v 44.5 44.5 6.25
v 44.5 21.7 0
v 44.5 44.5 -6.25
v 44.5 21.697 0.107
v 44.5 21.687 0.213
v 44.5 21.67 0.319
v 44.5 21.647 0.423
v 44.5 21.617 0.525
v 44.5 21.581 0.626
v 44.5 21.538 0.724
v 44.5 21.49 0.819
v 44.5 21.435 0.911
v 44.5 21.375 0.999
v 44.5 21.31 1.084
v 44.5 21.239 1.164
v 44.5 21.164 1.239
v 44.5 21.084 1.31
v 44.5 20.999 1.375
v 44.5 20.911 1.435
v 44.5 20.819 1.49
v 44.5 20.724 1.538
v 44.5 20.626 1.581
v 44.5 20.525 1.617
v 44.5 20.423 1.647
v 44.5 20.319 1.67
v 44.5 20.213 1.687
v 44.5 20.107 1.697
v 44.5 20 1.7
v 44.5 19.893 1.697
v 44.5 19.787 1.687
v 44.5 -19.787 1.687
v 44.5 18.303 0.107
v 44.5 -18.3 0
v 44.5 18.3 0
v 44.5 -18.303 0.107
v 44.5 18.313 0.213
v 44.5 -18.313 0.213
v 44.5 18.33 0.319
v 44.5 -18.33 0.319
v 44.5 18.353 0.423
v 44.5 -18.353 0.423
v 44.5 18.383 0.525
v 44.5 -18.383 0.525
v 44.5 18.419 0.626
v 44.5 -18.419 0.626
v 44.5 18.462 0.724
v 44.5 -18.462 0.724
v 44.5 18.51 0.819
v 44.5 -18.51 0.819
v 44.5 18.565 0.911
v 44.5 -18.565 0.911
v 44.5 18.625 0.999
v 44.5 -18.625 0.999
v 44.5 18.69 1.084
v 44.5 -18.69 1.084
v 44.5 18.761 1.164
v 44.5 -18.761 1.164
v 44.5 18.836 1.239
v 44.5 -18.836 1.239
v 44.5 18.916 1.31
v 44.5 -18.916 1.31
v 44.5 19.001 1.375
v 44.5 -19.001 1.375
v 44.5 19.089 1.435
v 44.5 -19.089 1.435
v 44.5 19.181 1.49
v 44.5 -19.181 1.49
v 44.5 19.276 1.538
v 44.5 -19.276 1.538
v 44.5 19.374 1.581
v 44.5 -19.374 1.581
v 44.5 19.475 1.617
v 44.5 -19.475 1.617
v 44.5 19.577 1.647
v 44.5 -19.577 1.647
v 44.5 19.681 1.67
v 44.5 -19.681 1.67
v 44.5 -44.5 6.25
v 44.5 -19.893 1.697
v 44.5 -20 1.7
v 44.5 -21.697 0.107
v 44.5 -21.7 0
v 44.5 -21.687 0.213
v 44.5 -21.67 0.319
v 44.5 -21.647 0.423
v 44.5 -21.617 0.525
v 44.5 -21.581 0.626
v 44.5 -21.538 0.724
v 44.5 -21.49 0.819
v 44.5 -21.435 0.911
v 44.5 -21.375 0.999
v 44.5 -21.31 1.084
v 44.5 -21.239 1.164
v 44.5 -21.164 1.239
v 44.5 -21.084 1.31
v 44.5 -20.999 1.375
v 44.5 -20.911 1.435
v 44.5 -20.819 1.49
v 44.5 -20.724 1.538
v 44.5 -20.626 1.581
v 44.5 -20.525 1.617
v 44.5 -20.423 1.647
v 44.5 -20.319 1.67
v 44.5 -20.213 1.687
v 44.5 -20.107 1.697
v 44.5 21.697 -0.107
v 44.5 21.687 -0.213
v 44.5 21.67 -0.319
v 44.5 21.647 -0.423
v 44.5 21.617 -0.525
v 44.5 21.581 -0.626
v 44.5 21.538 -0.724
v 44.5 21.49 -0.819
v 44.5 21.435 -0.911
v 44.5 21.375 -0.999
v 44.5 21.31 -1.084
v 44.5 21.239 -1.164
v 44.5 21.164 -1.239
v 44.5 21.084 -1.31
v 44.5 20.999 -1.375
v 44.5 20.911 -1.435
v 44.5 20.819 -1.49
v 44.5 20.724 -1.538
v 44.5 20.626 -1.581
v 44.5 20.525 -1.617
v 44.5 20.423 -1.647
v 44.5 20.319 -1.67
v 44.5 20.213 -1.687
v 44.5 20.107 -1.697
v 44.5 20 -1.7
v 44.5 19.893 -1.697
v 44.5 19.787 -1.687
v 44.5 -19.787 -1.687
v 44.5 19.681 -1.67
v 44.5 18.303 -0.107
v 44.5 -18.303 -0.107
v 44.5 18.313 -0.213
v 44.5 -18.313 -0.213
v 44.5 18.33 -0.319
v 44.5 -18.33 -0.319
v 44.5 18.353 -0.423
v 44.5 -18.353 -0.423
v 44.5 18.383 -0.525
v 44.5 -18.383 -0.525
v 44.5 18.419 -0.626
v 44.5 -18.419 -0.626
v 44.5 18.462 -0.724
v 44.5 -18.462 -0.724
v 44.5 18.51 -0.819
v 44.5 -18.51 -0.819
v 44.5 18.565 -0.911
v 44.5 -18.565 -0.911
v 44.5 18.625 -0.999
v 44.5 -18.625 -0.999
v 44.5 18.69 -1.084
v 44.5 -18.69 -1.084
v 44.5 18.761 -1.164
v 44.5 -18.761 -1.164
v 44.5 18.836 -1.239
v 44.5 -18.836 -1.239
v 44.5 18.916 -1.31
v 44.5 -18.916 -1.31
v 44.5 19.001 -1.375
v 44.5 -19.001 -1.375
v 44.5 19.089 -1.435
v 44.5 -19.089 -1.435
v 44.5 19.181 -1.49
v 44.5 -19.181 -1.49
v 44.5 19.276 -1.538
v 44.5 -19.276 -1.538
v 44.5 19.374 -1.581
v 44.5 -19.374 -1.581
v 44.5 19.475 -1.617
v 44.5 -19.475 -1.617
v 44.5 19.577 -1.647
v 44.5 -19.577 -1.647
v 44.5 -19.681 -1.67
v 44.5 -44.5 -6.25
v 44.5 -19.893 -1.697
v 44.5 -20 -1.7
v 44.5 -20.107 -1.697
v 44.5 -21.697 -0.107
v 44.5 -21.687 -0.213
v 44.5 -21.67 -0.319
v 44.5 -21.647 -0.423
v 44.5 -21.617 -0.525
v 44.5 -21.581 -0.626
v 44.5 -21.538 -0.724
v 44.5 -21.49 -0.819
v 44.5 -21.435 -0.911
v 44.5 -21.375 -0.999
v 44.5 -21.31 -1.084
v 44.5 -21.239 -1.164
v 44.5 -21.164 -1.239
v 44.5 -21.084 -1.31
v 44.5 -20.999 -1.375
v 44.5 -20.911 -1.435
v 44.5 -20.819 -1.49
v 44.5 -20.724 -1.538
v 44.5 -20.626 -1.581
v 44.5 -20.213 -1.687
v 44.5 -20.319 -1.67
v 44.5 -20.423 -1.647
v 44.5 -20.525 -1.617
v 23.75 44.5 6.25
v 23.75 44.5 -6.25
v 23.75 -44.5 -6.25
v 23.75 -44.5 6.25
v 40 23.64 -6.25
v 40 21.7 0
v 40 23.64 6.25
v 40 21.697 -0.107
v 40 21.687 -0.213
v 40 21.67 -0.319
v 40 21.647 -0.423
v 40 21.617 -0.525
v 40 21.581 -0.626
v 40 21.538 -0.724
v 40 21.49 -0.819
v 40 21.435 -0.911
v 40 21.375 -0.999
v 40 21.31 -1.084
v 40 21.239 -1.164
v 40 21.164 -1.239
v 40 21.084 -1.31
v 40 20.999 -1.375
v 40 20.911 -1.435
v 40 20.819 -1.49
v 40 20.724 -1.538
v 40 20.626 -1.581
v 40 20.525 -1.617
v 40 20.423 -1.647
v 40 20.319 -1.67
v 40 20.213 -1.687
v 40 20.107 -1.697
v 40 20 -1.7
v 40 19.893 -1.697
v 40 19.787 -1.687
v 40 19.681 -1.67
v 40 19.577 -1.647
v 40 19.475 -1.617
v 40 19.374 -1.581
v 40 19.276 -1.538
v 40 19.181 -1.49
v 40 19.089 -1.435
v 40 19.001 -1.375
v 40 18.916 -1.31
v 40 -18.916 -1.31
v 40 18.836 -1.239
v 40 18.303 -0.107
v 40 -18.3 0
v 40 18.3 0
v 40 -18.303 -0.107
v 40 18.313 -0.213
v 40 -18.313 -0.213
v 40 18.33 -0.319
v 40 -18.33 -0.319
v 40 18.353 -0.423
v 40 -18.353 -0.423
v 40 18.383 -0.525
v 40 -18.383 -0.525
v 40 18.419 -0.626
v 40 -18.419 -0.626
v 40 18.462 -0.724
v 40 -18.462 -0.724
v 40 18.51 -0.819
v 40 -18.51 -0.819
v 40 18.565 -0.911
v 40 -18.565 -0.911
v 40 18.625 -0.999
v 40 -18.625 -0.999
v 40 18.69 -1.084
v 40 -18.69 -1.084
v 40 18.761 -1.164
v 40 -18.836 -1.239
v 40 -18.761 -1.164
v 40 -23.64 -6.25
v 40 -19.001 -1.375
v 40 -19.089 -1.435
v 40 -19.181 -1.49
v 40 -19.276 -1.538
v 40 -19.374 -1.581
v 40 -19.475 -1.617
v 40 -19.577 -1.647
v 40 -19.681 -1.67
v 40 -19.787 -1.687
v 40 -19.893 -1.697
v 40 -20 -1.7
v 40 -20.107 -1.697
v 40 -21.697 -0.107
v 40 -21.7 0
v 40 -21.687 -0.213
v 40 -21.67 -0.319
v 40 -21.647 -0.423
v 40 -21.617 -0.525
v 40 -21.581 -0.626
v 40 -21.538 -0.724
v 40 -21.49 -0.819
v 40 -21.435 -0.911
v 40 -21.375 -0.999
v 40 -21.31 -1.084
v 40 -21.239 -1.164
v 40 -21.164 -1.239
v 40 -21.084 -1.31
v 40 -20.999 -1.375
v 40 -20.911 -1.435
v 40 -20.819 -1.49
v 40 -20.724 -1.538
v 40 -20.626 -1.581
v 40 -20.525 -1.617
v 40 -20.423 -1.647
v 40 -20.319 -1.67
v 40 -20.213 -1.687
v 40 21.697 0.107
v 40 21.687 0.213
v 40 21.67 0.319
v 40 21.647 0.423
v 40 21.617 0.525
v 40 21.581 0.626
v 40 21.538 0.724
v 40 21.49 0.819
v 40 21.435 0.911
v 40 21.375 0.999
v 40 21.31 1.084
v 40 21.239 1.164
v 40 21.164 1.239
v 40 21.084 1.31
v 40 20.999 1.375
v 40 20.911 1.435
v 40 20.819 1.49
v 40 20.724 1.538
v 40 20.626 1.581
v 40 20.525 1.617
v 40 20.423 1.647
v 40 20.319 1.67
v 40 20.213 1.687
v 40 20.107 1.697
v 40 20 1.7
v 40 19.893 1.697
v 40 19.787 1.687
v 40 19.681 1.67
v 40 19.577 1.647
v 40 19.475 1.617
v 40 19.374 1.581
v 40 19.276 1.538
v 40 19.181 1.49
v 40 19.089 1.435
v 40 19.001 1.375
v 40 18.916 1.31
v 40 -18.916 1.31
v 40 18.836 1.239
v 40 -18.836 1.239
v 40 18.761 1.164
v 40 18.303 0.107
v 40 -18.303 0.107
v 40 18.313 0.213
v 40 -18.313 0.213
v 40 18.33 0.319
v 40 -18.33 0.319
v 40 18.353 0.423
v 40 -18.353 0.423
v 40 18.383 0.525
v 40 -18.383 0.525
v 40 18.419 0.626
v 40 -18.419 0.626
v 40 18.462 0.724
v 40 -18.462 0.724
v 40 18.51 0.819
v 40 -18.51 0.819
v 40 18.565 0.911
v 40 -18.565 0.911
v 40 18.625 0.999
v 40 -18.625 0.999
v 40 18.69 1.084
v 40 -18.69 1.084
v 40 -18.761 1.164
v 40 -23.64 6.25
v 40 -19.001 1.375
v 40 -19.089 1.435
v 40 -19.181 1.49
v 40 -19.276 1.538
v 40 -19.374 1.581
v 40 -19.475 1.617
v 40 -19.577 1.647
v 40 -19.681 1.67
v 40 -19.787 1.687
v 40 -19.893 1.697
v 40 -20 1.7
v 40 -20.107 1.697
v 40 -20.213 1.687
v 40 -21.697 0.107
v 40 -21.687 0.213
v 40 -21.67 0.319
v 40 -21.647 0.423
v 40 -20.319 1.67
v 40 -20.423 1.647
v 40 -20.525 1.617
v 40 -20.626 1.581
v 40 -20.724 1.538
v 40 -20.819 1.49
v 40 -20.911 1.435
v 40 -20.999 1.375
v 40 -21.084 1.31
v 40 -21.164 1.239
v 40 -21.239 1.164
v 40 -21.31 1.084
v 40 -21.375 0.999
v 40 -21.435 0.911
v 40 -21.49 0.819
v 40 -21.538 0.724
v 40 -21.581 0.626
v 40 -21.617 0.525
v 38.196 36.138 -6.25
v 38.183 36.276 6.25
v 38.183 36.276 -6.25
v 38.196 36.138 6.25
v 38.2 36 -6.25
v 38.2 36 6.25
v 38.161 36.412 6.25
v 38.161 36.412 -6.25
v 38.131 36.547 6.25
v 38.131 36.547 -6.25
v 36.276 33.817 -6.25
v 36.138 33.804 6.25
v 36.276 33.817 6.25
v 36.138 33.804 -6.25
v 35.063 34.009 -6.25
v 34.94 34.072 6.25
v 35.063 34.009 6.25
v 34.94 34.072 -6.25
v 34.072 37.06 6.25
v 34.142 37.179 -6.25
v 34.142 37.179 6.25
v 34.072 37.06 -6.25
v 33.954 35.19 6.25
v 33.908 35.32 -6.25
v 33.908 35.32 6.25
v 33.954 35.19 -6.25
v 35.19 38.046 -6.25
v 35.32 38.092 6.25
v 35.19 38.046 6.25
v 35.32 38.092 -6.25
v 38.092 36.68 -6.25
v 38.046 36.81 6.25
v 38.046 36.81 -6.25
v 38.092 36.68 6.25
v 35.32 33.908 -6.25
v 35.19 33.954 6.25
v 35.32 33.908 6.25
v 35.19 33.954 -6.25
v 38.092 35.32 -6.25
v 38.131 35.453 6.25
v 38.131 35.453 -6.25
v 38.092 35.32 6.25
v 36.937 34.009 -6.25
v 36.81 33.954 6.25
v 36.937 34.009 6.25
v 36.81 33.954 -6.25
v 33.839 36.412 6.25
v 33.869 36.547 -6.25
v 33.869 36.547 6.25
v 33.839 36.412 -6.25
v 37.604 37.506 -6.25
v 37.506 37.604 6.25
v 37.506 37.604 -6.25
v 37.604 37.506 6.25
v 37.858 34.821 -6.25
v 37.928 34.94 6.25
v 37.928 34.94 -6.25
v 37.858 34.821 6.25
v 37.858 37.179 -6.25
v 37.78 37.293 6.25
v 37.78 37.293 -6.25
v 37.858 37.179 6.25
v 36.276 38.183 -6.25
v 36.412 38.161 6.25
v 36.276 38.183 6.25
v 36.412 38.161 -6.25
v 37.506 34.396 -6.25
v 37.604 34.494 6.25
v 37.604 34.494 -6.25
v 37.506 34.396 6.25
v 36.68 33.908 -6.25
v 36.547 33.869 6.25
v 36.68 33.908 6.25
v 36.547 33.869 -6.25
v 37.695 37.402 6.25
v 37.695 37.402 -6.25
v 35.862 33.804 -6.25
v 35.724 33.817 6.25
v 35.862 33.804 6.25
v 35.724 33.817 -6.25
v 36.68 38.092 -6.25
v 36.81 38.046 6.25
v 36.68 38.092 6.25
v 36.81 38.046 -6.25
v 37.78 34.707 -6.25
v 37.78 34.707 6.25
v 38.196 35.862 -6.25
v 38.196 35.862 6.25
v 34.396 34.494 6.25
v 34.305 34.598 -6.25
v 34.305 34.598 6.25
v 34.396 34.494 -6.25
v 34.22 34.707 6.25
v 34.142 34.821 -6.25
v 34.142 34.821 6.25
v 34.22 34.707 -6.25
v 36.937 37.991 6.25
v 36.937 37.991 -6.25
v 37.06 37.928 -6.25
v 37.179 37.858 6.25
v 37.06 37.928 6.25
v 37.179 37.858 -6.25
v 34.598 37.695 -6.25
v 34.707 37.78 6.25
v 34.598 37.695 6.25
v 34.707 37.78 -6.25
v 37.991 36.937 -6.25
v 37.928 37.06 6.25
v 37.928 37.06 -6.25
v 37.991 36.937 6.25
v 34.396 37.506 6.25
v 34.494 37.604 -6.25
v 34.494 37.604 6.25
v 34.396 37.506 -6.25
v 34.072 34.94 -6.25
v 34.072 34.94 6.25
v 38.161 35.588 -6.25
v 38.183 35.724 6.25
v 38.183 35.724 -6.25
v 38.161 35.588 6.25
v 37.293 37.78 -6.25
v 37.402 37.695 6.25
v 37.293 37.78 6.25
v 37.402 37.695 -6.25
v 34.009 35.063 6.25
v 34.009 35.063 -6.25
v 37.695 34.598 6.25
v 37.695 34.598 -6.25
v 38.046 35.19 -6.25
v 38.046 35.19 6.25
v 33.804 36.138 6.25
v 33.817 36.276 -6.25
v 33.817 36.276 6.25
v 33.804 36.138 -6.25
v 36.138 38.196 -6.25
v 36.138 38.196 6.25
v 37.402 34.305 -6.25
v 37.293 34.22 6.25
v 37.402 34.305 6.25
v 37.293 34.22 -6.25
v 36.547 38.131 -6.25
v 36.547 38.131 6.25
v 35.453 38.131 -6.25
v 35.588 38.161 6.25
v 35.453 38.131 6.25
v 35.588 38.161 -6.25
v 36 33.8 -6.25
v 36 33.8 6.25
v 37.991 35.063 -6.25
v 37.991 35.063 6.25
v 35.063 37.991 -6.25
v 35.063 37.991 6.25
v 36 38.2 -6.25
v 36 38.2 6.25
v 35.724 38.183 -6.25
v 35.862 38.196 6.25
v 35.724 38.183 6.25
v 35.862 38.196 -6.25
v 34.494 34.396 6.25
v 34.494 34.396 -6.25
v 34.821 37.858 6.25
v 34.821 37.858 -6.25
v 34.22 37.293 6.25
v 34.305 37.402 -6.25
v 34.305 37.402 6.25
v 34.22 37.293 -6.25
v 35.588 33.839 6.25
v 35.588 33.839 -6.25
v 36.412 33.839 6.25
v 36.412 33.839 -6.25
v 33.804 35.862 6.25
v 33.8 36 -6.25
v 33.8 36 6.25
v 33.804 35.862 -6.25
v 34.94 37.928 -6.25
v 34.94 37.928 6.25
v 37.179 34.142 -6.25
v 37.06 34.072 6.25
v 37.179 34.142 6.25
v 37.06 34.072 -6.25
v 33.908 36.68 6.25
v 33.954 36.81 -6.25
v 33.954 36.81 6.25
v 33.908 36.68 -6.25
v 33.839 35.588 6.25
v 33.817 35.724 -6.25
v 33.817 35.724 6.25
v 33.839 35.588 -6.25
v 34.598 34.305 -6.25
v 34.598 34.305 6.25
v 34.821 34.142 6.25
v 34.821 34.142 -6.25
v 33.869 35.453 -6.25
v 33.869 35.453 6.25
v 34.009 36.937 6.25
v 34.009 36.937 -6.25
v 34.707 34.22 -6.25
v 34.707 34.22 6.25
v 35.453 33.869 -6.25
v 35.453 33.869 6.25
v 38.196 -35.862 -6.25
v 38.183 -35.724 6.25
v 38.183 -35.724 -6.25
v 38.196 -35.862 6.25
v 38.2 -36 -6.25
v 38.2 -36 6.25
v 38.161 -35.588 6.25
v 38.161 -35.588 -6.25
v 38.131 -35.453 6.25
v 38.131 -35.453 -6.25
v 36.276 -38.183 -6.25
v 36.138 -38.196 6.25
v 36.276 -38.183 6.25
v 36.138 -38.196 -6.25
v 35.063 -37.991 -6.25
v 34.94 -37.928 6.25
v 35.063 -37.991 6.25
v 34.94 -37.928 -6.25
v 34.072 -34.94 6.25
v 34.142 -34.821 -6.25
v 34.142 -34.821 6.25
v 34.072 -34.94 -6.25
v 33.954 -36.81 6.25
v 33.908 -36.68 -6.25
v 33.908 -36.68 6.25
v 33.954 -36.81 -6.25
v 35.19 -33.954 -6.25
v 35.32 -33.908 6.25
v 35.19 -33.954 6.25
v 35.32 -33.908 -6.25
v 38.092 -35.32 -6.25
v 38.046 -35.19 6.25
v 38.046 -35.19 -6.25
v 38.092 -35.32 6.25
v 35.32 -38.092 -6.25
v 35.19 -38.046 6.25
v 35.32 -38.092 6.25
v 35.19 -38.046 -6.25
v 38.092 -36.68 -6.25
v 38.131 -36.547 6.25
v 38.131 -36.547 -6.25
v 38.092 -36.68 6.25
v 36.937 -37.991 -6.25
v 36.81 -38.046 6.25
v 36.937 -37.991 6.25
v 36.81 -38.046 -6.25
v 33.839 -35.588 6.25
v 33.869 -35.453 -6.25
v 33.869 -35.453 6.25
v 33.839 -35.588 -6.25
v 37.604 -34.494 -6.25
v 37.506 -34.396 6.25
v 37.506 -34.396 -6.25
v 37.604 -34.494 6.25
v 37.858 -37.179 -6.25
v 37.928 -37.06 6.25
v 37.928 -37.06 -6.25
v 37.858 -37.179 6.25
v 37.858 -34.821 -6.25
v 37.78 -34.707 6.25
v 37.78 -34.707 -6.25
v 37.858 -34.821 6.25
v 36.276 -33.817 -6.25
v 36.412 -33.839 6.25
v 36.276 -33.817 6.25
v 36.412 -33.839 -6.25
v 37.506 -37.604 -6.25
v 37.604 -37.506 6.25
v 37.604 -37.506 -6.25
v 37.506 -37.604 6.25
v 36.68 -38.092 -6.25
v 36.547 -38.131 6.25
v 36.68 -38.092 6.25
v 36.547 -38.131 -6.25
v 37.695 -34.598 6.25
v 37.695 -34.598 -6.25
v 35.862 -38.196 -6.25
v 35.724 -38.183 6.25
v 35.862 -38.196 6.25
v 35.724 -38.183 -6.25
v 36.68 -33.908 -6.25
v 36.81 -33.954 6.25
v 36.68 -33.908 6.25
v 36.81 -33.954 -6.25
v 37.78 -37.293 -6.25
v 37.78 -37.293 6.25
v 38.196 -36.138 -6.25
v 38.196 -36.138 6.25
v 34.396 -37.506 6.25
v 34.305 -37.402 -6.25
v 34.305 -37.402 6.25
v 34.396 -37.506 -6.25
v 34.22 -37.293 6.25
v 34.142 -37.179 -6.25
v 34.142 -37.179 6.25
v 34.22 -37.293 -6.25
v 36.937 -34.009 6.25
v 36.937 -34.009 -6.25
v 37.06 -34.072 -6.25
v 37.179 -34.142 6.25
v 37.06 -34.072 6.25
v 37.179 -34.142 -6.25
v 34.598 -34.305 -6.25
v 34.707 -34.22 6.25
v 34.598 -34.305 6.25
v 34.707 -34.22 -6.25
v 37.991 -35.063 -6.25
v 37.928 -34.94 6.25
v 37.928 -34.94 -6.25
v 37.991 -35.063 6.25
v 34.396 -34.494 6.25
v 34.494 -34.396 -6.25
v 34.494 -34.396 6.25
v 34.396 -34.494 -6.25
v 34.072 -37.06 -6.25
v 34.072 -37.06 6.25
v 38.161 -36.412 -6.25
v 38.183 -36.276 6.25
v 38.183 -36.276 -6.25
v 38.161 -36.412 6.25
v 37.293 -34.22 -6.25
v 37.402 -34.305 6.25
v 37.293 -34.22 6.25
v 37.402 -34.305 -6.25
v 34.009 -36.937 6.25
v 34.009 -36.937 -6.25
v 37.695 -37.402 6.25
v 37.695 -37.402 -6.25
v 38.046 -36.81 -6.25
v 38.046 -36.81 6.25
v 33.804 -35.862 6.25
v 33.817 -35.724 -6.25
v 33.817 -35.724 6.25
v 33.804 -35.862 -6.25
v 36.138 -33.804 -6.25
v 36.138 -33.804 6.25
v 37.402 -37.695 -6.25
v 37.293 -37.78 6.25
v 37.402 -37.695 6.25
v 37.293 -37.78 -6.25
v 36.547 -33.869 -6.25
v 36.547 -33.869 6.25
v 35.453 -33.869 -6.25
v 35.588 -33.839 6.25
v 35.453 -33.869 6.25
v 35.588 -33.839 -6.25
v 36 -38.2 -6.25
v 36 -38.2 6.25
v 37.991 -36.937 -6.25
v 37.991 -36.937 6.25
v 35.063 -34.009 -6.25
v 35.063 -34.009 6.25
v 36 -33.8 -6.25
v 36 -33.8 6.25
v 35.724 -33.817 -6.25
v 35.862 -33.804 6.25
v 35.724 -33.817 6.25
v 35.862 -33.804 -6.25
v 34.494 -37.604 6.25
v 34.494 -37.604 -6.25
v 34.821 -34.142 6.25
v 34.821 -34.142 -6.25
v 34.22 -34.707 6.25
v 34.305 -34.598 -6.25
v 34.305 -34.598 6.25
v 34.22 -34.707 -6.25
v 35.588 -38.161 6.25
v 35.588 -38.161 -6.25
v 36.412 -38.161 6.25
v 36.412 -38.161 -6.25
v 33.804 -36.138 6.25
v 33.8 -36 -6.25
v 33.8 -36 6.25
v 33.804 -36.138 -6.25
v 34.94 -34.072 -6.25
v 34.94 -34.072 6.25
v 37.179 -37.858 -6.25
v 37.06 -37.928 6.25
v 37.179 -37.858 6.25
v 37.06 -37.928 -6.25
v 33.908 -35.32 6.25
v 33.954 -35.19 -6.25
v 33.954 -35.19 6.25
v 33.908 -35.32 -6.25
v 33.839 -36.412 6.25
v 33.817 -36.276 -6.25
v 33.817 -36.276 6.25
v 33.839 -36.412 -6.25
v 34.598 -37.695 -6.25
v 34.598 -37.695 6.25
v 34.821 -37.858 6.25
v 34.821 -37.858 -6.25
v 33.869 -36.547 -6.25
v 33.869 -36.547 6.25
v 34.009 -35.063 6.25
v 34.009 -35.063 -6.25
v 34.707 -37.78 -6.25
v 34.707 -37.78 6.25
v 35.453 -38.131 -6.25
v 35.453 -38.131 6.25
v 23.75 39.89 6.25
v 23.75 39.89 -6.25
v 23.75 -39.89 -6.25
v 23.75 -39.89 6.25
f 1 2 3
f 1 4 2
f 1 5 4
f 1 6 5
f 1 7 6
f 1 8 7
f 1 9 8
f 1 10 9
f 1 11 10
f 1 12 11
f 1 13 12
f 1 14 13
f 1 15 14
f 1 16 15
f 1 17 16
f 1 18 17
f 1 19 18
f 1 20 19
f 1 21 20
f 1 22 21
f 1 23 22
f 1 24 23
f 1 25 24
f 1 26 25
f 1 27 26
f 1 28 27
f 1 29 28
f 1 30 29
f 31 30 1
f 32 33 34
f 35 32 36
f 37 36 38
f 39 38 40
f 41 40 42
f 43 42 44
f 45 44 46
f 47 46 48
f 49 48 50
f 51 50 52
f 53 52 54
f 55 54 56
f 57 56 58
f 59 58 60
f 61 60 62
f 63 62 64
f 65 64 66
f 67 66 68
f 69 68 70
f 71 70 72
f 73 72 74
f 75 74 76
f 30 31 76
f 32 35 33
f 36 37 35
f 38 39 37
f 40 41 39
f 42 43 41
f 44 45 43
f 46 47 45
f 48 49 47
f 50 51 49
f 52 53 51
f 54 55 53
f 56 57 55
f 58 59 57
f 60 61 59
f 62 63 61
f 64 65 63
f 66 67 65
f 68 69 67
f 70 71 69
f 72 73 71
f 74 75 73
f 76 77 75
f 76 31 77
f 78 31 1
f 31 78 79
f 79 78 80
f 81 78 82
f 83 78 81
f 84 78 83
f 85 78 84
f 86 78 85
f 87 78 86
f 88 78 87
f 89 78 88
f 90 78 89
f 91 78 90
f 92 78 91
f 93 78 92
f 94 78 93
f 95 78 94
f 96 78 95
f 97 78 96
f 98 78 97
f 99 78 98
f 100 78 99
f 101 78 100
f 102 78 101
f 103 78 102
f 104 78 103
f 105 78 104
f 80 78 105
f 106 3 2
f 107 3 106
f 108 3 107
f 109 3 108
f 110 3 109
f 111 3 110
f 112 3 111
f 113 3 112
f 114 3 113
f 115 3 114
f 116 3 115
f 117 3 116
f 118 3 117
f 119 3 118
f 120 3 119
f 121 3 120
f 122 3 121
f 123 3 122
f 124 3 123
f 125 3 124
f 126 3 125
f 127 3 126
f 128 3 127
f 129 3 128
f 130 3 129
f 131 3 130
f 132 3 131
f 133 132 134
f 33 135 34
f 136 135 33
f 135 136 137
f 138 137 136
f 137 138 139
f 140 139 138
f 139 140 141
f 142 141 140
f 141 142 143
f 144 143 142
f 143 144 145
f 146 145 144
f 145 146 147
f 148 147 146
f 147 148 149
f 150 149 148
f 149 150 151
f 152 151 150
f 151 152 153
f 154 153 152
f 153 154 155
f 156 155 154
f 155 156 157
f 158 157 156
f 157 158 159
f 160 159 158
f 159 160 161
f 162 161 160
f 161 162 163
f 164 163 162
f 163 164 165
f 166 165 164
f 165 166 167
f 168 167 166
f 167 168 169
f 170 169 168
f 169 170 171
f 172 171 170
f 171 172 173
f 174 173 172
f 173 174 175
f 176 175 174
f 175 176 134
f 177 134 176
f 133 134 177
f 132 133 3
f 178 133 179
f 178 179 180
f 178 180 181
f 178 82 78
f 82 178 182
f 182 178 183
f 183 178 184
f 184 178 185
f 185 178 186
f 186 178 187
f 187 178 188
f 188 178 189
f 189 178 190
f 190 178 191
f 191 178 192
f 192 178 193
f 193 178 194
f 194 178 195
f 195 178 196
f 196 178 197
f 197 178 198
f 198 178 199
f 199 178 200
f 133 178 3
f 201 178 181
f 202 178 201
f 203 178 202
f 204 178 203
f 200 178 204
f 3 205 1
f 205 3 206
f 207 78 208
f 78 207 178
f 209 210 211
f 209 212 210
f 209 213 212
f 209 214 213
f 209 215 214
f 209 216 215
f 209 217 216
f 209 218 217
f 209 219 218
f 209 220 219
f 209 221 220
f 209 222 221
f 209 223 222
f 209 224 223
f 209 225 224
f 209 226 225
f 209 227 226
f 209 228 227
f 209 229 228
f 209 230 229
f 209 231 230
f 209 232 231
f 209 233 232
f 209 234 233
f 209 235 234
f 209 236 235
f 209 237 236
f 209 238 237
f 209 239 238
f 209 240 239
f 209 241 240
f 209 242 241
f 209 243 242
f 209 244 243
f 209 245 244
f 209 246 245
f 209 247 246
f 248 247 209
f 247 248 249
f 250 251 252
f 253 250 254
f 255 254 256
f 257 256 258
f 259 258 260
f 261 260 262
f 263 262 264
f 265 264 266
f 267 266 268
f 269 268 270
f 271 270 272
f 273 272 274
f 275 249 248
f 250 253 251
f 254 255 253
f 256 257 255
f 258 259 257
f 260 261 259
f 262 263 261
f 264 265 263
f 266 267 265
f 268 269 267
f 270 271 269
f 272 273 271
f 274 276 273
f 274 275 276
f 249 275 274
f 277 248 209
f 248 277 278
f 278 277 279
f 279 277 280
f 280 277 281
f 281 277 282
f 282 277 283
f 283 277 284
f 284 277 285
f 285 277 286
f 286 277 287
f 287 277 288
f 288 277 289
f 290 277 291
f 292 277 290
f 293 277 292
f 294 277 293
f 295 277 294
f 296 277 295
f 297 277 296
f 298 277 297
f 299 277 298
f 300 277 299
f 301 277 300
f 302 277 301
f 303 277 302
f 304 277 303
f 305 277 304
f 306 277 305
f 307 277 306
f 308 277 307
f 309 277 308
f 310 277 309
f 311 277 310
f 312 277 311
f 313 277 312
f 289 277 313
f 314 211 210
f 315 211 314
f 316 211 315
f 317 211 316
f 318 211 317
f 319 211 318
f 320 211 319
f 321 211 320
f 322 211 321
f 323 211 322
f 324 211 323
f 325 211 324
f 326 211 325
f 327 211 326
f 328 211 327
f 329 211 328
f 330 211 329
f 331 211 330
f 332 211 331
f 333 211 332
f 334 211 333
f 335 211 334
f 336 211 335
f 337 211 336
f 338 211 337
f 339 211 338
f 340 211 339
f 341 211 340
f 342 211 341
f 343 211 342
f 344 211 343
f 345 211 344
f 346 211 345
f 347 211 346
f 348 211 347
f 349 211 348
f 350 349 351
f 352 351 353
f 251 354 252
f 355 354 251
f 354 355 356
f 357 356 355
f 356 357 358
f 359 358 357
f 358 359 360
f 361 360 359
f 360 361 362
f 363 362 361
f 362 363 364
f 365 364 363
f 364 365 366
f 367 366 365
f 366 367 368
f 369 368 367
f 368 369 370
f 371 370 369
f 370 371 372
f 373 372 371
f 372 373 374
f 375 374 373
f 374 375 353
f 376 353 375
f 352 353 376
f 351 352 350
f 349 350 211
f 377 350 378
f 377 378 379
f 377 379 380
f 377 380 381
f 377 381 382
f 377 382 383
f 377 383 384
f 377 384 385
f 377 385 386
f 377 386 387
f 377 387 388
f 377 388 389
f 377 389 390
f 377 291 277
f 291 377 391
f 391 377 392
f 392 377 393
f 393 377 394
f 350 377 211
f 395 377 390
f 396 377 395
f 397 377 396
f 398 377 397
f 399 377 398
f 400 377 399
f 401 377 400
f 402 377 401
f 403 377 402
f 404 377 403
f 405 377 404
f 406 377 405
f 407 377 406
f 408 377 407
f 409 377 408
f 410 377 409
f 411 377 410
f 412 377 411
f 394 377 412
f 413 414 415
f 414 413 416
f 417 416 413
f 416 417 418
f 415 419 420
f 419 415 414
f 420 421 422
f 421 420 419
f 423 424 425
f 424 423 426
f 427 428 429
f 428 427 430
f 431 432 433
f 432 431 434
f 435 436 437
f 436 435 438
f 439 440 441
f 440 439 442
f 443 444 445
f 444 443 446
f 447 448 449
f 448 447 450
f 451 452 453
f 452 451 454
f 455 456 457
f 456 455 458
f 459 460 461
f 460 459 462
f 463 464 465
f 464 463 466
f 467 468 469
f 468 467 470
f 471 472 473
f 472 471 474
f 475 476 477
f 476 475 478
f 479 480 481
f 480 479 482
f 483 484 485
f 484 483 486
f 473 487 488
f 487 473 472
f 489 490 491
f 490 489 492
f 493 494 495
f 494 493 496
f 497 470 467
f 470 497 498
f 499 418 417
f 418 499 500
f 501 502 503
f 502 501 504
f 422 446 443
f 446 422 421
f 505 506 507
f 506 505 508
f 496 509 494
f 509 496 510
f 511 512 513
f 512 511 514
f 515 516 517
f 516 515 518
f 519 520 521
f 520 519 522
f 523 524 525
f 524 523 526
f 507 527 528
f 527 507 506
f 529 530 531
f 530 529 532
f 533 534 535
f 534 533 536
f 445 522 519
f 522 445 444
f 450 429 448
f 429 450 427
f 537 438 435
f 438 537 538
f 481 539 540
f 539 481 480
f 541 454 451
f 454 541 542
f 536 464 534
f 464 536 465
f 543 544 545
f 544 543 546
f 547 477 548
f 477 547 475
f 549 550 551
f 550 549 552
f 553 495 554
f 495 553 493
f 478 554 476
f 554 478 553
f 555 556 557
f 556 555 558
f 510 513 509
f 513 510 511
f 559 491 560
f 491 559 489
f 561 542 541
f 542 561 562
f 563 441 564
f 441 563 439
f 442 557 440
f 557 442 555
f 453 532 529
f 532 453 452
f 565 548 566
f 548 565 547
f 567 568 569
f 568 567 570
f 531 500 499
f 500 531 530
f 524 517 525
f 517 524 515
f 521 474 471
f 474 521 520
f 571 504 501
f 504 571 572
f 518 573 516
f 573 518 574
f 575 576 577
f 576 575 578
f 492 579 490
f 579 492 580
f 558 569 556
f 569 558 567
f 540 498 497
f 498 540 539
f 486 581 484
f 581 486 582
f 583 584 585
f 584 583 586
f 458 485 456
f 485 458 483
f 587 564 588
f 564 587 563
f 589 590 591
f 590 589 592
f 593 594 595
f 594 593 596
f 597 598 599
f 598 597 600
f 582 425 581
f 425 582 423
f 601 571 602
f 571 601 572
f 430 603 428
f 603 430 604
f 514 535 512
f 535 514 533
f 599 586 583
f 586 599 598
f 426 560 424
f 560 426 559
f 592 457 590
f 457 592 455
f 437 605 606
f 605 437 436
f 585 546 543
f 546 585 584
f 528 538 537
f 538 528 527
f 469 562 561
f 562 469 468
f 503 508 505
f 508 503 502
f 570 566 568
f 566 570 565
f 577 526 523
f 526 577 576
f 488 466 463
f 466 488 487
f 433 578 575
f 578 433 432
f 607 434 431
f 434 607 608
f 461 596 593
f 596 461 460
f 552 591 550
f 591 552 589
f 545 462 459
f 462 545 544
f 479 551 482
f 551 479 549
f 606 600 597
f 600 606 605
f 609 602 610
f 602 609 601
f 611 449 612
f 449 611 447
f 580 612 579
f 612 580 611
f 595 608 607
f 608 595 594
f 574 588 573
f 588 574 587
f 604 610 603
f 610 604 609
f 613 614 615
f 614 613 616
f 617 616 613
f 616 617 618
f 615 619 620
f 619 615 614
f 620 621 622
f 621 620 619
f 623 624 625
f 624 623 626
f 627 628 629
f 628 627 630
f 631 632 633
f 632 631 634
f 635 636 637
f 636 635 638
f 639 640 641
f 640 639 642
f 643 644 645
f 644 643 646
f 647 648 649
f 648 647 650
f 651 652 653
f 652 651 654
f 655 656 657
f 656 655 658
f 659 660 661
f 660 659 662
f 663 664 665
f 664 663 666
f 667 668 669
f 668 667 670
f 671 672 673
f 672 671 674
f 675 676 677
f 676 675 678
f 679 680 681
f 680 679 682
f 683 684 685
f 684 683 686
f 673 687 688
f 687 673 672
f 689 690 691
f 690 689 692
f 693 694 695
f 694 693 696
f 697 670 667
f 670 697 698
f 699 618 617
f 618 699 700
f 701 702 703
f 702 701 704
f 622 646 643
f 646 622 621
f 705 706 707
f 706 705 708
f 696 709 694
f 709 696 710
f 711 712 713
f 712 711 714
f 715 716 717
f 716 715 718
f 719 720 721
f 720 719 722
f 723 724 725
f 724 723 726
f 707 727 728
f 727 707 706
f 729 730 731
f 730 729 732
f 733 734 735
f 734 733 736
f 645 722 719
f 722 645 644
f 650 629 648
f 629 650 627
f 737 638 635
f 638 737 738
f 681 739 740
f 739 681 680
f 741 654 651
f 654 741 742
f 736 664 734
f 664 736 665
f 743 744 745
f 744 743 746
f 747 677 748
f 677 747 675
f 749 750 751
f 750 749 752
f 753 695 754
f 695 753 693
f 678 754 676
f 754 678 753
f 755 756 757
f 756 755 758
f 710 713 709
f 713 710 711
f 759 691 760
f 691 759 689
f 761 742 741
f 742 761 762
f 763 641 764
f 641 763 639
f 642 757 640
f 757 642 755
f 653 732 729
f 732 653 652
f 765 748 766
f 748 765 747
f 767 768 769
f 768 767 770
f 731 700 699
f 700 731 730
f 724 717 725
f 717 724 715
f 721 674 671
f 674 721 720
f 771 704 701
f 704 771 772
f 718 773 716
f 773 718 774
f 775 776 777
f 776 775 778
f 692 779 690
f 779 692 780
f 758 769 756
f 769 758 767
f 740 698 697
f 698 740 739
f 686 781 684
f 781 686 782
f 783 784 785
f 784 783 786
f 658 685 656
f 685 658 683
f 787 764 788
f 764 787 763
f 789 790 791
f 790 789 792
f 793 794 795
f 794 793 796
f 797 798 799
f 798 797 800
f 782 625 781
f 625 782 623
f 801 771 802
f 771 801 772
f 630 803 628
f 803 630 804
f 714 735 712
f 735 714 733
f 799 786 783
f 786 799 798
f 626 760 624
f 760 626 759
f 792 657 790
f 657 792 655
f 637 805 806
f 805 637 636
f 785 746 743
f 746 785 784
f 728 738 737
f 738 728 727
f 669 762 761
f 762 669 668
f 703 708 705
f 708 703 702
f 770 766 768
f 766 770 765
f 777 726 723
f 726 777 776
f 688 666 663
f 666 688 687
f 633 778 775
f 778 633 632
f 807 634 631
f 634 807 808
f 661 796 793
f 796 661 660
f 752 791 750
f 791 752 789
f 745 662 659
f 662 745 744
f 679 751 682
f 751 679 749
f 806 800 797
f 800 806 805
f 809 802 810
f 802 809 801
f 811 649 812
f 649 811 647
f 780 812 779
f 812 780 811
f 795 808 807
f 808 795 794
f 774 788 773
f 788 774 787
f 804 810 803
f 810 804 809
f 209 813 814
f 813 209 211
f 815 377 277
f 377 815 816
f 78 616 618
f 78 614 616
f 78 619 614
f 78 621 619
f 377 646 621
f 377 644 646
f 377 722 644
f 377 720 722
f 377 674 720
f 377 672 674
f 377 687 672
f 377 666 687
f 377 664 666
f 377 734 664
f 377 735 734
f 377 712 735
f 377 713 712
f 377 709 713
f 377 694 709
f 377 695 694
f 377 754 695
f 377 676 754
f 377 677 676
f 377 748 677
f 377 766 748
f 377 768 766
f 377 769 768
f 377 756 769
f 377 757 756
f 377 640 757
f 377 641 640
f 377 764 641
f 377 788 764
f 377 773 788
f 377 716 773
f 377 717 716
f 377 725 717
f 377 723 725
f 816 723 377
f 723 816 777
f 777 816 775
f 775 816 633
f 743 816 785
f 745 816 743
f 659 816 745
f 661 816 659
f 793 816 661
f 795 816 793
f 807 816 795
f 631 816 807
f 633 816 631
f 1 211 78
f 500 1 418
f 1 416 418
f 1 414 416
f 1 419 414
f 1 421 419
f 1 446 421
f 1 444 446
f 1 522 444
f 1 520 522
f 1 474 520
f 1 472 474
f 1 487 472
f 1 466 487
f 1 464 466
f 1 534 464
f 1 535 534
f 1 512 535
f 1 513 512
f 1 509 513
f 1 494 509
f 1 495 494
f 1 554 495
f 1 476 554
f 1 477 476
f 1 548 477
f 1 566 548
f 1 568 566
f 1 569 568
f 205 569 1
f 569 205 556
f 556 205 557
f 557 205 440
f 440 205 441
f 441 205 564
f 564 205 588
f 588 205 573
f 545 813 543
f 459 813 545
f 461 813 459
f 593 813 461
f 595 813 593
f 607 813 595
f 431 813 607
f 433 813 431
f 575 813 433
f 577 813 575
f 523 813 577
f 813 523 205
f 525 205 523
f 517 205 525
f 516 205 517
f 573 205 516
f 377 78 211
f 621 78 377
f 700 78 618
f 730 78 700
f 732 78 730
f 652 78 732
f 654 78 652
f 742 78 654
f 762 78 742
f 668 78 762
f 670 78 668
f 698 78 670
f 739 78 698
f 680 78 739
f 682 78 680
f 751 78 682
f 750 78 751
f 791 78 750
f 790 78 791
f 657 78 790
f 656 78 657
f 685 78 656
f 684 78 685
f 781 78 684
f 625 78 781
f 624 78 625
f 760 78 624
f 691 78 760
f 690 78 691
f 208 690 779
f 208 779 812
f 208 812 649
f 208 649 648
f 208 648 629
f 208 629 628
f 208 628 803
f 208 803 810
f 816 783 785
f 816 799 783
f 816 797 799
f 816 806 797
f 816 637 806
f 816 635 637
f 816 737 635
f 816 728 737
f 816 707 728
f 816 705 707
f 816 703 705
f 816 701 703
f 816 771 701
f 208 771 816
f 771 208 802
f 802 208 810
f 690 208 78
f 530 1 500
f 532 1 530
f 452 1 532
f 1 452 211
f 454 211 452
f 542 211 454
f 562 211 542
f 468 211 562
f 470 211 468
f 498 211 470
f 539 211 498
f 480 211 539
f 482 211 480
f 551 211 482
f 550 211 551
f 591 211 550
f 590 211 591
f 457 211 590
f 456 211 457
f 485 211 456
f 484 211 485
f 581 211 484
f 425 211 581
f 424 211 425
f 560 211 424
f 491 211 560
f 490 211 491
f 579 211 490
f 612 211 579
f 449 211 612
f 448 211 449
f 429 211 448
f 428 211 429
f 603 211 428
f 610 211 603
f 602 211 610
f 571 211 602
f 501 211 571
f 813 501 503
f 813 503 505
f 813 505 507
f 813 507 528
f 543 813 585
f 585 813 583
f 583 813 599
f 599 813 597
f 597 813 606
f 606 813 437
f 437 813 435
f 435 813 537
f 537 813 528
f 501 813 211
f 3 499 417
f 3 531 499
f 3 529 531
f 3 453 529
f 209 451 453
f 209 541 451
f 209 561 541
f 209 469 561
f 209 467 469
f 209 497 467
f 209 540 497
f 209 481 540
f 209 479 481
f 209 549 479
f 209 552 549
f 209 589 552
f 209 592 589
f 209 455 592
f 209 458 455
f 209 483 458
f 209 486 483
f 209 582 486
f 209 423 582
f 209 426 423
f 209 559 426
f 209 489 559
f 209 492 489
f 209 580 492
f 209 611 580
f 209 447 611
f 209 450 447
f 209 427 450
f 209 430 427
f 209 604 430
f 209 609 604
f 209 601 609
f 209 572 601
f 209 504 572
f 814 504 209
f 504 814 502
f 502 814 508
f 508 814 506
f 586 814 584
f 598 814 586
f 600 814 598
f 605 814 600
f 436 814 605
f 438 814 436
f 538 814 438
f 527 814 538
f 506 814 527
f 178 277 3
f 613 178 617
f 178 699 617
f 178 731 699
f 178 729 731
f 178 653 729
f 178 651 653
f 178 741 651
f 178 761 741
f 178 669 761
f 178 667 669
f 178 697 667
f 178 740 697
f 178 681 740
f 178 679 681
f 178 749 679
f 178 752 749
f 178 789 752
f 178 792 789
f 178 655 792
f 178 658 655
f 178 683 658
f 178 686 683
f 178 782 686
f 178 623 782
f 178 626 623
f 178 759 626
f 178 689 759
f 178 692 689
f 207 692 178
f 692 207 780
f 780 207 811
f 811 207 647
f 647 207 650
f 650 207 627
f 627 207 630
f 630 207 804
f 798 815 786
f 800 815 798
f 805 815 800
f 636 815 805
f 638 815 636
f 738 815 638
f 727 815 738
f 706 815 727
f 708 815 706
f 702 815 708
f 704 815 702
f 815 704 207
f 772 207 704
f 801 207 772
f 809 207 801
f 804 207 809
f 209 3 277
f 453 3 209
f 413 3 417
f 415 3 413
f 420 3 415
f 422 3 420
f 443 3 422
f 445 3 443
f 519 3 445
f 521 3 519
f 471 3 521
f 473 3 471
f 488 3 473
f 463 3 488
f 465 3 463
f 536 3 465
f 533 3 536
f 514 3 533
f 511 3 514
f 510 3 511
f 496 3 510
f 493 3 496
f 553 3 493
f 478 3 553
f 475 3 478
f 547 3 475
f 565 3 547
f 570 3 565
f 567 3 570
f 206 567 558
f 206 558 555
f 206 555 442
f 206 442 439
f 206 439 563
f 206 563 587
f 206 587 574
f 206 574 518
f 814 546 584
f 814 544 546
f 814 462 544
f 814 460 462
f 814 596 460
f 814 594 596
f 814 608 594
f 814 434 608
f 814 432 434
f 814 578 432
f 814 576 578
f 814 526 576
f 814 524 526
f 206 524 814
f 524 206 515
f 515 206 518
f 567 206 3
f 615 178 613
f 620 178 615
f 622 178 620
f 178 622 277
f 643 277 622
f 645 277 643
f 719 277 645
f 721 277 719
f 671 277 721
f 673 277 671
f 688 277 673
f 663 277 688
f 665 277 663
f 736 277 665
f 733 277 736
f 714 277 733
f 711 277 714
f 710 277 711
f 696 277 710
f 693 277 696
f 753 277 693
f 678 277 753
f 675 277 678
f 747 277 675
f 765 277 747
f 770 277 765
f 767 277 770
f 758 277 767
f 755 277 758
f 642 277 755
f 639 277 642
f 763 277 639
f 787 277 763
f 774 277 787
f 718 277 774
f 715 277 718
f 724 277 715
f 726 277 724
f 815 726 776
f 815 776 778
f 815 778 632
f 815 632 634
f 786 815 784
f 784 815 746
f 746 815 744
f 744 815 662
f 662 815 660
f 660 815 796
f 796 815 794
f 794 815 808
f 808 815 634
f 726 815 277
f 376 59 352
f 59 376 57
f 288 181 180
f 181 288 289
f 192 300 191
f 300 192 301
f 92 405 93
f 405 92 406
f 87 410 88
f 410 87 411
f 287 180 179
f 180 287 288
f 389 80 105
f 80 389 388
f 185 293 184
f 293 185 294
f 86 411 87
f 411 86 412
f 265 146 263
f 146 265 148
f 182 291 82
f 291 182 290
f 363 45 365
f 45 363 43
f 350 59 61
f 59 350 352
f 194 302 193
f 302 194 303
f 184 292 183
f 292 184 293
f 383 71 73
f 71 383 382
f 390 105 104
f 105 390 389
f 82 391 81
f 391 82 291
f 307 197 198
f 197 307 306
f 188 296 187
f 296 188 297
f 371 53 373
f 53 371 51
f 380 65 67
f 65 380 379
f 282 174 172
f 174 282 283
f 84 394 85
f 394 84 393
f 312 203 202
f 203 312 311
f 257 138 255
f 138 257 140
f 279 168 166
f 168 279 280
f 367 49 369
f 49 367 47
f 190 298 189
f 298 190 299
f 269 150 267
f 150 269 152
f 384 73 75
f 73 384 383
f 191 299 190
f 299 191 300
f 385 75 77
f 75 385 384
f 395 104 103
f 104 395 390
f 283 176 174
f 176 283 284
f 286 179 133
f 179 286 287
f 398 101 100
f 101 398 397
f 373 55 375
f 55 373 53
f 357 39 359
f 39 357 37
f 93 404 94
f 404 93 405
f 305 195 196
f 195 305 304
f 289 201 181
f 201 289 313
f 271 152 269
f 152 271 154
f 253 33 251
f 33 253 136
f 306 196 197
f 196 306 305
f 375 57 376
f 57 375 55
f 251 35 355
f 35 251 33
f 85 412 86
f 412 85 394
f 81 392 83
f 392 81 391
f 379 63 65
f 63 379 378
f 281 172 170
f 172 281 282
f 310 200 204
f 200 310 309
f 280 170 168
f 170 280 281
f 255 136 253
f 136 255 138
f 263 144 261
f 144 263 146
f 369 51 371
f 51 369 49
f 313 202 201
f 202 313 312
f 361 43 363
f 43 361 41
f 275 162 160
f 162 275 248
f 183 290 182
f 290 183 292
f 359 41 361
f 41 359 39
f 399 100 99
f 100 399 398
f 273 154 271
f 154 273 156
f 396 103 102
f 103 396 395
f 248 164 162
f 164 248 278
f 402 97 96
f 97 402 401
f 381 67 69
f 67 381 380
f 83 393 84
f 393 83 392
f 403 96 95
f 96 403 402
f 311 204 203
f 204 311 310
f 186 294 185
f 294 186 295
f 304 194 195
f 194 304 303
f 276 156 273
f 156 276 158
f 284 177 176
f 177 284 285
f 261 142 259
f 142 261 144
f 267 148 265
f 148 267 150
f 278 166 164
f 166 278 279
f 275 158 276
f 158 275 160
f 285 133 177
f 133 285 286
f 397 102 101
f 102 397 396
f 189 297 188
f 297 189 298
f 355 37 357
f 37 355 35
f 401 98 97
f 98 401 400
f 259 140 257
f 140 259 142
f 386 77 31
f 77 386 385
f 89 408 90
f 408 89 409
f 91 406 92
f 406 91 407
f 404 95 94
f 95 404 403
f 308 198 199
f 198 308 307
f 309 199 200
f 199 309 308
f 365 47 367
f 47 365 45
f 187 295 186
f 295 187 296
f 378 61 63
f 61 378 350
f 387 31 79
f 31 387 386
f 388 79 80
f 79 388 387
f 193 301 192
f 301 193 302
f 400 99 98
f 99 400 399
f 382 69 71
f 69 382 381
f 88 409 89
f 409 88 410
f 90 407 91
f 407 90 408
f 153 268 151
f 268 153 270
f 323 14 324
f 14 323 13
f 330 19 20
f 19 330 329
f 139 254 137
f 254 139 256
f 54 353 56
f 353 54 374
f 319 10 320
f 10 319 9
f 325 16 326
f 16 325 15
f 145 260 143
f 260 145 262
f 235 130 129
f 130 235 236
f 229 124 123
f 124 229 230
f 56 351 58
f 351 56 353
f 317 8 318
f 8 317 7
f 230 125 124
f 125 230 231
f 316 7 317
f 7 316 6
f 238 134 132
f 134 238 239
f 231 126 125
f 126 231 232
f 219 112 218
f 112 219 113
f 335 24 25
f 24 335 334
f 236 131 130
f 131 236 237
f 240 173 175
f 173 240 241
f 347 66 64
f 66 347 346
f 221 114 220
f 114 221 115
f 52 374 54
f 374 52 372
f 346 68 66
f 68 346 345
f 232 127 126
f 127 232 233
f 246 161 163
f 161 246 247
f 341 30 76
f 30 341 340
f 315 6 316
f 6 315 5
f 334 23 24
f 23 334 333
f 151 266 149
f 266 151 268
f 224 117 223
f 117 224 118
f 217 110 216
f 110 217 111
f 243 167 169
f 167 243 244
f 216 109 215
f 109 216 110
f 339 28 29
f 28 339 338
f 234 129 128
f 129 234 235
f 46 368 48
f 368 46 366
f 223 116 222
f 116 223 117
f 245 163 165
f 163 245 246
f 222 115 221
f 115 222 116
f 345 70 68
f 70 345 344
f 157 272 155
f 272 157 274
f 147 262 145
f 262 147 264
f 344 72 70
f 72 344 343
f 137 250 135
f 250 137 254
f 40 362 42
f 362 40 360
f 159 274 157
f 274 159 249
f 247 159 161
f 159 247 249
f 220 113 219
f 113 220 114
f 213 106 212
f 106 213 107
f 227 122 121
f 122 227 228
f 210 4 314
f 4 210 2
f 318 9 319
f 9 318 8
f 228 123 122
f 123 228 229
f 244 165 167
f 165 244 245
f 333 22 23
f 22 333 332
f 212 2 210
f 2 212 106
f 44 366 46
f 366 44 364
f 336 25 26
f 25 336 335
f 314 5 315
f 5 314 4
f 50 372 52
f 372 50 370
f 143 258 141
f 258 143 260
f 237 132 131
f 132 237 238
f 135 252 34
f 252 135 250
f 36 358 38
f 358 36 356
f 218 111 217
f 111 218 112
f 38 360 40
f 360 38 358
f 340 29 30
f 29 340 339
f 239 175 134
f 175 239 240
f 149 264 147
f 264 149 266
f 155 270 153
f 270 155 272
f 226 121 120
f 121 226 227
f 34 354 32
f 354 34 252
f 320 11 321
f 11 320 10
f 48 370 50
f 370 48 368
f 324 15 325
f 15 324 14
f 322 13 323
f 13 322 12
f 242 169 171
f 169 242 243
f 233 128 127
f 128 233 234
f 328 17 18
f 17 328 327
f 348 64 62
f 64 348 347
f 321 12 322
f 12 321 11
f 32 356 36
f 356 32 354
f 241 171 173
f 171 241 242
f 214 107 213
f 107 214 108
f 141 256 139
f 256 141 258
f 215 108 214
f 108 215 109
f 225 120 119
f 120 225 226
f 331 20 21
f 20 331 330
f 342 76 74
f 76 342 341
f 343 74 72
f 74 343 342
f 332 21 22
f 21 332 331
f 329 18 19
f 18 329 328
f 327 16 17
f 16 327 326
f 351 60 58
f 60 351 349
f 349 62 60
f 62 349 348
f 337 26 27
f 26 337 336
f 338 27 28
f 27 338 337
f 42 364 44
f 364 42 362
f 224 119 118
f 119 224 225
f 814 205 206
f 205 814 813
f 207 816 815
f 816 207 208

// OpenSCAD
module body (){
    difference(){
        cube (size =[15,15,15], center=true);
        translate([15/2,15/2,0])rotate([0,0,45]) cube (size =[30,30,30], center=true);
    }
}

module dirka(size=3){
    cylinder(d=size+0.4, center=true, h=55, $fn=100);
    translate([72,0,0])cylinder(d=size+0.4, center=true, h=55, $fn=100);
    
}

module coolerHoles(diam=4){
                translate([-72/2,0,0])
            for(i=[1,-1]){
                 translate([0,i*72/2,0])
                for(i=[0:1]){
                    translate([i*72,0,0])cylinder(d=diam+0.4, center=true, h=55, $fn=100);
                }
            }
}

module cooler(size=80){
        difference(){
            union(){
                cube (size=[80,80,25], center=true);
                cylinder(d=81, h=16, center=true);
            }
            coolerHoles();
            cylinder (d=75, center=true, h=50);
            rotate([0,0,45])cube(size=[90,90,16], center=true);
            
        }
        
    }
    

    //whole render detail
    difference(){
        union(){
            difference(){
                cube([89,89,24], center=true);
                cube([80,80,25], center=true);
            }
            cooler();
        }
        for(i=[1,-1]){
            translate([0,0,i*25/2])cube([90,90,25/2],center=true);
        }
        //make 1 side
        translate([-95/4,0,0])cube(size=[95,95,30], center=true);
        //holes for wood
        for(i=[-1,1]){
            translate([0,20*i,0])rotate([0,90,0])cylinder (d=3+0.4, h=150, center=true, $fn=100);
        }
    }
    
